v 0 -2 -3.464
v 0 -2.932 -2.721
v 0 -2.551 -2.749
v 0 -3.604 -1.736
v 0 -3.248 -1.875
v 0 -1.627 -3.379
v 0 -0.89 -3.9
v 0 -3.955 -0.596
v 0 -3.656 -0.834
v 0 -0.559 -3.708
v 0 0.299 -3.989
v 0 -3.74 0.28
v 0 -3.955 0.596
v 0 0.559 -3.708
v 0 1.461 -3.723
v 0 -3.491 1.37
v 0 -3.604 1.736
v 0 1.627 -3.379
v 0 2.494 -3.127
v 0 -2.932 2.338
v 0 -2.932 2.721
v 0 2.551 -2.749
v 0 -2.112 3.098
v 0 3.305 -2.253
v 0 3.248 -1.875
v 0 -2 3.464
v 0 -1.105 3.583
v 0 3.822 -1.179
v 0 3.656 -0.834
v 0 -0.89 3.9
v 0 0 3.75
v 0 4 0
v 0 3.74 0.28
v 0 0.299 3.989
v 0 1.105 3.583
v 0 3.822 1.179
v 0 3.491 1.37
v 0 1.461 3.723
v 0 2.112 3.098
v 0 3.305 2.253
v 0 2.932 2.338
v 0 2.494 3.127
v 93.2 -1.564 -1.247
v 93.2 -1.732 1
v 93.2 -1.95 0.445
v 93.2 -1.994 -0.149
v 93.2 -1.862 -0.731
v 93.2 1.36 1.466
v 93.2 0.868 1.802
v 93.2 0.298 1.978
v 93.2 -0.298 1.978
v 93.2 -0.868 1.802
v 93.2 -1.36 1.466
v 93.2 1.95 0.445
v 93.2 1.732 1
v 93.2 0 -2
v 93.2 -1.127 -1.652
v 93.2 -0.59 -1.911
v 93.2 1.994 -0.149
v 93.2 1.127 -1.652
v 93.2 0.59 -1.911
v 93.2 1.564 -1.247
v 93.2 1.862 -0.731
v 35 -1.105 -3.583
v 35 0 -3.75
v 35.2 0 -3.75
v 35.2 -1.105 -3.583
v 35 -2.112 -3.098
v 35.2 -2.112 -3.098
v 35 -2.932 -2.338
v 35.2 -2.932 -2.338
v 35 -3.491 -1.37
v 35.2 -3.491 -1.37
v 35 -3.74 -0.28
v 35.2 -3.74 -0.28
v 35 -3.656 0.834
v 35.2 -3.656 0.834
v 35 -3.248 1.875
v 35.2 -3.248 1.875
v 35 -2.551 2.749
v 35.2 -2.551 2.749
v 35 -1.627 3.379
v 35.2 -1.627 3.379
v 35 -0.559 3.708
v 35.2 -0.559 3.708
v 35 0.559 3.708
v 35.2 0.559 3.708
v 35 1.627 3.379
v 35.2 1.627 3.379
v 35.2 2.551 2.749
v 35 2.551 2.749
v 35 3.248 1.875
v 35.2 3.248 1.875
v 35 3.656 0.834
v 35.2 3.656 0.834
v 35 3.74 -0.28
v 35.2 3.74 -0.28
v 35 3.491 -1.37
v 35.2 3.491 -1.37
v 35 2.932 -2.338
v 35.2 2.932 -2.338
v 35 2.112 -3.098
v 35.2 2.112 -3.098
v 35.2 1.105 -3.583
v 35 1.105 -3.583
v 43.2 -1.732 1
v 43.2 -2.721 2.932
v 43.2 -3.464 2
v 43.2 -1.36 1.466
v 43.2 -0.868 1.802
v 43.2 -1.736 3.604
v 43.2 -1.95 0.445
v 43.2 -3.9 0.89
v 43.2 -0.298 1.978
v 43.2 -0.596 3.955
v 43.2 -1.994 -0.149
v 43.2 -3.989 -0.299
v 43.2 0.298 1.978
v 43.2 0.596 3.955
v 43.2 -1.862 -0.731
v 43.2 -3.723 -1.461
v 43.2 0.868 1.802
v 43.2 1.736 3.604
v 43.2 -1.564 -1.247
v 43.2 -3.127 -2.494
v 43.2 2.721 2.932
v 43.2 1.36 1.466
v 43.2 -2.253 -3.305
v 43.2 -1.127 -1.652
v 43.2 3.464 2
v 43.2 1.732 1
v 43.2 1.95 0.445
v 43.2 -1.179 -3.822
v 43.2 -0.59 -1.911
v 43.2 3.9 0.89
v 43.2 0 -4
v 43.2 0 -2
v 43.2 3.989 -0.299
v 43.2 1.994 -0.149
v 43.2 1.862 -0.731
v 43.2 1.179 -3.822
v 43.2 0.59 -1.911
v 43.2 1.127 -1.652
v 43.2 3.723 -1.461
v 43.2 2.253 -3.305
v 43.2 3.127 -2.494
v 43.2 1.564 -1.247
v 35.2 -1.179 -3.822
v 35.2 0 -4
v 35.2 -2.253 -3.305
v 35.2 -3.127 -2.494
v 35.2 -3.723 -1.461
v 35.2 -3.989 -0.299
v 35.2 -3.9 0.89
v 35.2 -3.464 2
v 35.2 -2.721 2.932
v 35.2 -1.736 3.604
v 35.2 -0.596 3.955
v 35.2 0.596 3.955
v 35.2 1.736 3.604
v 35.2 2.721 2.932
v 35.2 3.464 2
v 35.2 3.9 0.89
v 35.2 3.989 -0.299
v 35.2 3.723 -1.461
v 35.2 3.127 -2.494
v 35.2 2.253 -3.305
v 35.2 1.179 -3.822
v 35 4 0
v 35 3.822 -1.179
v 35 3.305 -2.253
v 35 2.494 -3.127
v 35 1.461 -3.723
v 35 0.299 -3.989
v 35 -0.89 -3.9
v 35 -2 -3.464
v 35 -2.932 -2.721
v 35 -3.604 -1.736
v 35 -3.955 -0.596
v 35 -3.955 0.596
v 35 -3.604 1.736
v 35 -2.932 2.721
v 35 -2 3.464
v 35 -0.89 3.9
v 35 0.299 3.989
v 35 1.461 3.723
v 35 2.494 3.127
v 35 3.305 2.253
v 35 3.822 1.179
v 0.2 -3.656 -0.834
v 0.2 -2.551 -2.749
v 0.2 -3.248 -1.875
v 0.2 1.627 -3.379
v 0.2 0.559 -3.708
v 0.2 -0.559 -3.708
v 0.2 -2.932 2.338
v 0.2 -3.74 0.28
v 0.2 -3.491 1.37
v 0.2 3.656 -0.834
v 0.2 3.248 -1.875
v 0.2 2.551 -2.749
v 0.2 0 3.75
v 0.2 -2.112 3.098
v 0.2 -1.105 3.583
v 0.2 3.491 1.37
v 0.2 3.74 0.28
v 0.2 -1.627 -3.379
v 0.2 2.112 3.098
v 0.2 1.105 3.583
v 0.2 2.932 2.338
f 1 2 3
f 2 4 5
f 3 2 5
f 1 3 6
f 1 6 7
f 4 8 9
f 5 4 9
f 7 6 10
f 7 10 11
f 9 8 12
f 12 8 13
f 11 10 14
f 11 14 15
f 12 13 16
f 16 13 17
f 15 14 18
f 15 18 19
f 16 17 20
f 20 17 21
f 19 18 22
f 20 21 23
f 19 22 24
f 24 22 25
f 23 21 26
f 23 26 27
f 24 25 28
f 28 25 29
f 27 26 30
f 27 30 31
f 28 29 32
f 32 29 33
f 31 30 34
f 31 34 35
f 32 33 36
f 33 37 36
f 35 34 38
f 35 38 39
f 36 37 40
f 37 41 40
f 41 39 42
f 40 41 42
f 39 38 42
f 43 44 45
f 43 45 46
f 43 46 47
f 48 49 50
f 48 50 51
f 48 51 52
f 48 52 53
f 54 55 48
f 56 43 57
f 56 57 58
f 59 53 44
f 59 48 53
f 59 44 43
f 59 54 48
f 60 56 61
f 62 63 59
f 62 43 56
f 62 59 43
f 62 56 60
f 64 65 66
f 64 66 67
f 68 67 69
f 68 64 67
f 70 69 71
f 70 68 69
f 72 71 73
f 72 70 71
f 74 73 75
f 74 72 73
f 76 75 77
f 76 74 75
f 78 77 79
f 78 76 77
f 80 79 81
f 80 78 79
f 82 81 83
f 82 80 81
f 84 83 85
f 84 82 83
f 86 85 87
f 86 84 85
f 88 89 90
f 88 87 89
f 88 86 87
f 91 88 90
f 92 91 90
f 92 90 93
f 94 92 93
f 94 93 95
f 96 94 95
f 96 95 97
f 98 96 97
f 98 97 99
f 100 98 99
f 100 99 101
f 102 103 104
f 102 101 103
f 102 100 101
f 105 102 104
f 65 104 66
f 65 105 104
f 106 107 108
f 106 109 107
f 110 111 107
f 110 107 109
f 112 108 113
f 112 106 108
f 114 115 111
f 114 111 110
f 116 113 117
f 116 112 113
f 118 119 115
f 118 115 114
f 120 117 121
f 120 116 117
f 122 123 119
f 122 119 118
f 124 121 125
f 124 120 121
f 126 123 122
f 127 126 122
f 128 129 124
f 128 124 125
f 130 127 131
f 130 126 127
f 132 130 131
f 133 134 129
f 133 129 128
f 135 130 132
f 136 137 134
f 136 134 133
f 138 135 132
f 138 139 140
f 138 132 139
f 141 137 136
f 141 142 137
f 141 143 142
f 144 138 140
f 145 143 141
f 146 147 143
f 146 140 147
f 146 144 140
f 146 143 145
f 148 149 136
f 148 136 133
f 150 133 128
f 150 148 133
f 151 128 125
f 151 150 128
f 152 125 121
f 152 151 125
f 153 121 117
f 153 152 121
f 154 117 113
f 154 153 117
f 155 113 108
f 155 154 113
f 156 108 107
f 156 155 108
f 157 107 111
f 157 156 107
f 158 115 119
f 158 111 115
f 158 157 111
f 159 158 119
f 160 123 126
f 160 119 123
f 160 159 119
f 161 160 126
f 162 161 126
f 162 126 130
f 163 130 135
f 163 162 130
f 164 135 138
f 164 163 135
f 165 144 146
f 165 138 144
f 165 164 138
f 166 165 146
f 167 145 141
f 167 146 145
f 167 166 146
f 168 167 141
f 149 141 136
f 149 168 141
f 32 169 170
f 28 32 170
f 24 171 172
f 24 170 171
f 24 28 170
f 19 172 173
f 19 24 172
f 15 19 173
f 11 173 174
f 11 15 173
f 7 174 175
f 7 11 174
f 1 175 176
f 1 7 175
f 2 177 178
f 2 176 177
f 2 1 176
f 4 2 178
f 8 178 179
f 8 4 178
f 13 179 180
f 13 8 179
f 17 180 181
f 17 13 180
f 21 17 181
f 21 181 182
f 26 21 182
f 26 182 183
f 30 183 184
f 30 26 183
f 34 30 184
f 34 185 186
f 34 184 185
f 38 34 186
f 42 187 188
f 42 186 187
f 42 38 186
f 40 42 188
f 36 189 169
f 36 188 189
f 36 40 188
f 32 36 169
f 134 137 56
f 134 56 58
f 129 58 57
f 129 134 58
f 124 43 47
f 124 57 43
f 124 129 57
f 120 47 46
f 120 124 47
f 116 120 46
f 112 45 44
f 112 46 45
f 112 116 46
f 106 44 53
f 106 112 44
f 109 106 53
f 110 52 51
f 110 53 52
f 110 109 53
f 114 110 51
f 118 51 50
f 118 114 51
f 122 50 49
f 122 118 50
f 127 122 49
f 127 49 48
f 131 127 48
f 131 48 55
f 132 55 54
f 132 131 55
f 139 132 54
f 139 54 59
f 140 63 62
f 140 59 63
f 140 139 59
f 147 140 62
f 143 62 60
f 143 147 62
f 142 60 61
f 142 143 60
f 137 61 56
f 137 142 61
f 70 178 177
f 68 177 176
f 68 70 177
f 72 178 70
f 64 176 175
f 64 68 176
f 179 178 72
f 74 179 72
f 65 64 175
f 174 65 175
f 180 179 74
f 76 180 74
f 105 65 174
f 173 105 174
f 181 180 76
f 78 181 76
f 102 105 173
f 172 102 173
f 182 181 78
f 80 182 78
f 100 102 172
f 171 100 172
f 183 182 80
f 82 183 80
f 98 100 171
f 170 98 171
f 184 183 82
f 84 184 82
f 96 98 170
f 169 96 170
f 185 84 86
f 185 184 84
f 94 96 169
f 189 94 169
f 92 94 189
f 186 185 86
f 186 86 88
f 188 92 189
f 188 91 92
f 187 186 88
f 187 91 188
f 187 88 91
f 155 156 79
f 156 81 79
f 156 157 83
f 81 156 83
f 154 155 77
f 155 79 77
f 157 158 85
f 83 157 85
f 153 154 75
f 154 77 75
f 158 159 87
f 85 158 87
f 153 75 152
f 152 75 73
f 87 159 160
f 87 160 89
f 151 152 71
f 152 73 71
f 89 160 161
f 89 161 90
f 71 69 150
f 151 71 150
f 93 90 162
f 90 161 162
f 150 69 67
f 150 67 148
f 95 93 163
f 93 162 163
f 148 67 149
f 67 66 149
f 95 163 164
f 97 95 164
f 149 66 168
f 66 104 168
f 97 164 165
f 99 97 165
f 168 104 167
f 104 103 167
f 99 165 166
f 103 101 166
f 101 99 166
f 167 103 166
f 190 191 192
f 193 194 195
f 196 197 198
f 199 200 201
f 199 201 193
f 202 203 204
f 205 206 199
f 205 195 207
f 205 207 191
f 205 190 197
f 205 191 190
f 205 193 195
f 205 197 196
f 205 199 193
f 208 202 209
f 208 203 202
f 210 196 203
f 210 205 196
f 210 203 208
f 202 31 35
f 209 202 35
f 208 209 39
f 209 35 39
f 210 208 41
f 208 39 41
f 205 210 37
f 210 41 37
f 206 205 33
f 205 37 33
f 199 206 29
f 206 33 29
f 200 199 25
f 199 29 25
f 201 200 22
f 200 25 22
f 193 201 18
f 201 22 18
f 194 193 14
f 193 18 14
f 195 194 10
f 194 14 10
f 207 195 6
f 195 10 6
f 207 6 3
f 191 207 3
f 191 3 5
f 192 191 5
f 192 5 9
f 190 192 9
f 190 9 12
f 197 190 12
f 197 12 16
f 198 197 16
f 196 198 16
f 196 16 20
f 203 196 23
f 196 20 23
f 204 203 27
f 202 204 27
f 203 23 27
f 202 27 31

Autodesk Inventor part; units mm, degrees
ref_plane "YZ Plane" through (0, 0, 0) normal (1, 0, 0) x (0, 1, 0)
ref_plane "XZ Plane" through (0, 0, 0) normal (0, 1, 0) x (-1, 0, 0)
ref_plane "XY Plane" through (0, 0, 0) normal (0, 0, 1) x (1, 0, 0)
sketch "Sketch1" plane through (0, 0, 0) normal (1, 0, 0) x (0, 1, 0)
  circle A0 centre (0, 0) radius 4
  dimension "d0" = 8
extrude "Extrusion1" add sketch "Sketch1" along normal blind 35
sketch "Sketch2" plane through (0, 0, 0) normal (-1, 0, 0) x (0, 0, 1)
  circle A0 centre (0, 0) radius 3.75
  dimension "d3" = 7.5
extrude "Extrusion2" cut sketch "Sketch2" against normal blind 0.2
sketch "Sketch3" plane through (35, 0, 0) normal (1, 0, 0) x (0, 0, -1)
  circle A0 centre (0, 0) radius 3.75
  dimension "d6" = 7.5
extrude "Extrusion3" add sketch "Sketch3" along normal blind 0.2
sketch "Sketch4" plane through (35.2, 0, 0) normal (1, 0, 0) x (0, 0, -1)
  circle A0 centre (0, 0) radius 4 projected
  circle A1 centre (0, 0) radius 4
  dimension "d9" = 8
extrude "Extrusion4" add sketch "Sketch4" along normal blind 8
sketch "Sketch5" plane through (43.2, 0, 0) normal (1, 0, 0) x (0, 0, -1)
  circle A0 centre (0, 0) radius 2
  dimension "d12" = 4
extrude "Extrusion5" add sketch "Sketch5" along normal blind 50
properties part number "webcam_new" material "Steel, Paint Finish, Dark Gray, Matte"
